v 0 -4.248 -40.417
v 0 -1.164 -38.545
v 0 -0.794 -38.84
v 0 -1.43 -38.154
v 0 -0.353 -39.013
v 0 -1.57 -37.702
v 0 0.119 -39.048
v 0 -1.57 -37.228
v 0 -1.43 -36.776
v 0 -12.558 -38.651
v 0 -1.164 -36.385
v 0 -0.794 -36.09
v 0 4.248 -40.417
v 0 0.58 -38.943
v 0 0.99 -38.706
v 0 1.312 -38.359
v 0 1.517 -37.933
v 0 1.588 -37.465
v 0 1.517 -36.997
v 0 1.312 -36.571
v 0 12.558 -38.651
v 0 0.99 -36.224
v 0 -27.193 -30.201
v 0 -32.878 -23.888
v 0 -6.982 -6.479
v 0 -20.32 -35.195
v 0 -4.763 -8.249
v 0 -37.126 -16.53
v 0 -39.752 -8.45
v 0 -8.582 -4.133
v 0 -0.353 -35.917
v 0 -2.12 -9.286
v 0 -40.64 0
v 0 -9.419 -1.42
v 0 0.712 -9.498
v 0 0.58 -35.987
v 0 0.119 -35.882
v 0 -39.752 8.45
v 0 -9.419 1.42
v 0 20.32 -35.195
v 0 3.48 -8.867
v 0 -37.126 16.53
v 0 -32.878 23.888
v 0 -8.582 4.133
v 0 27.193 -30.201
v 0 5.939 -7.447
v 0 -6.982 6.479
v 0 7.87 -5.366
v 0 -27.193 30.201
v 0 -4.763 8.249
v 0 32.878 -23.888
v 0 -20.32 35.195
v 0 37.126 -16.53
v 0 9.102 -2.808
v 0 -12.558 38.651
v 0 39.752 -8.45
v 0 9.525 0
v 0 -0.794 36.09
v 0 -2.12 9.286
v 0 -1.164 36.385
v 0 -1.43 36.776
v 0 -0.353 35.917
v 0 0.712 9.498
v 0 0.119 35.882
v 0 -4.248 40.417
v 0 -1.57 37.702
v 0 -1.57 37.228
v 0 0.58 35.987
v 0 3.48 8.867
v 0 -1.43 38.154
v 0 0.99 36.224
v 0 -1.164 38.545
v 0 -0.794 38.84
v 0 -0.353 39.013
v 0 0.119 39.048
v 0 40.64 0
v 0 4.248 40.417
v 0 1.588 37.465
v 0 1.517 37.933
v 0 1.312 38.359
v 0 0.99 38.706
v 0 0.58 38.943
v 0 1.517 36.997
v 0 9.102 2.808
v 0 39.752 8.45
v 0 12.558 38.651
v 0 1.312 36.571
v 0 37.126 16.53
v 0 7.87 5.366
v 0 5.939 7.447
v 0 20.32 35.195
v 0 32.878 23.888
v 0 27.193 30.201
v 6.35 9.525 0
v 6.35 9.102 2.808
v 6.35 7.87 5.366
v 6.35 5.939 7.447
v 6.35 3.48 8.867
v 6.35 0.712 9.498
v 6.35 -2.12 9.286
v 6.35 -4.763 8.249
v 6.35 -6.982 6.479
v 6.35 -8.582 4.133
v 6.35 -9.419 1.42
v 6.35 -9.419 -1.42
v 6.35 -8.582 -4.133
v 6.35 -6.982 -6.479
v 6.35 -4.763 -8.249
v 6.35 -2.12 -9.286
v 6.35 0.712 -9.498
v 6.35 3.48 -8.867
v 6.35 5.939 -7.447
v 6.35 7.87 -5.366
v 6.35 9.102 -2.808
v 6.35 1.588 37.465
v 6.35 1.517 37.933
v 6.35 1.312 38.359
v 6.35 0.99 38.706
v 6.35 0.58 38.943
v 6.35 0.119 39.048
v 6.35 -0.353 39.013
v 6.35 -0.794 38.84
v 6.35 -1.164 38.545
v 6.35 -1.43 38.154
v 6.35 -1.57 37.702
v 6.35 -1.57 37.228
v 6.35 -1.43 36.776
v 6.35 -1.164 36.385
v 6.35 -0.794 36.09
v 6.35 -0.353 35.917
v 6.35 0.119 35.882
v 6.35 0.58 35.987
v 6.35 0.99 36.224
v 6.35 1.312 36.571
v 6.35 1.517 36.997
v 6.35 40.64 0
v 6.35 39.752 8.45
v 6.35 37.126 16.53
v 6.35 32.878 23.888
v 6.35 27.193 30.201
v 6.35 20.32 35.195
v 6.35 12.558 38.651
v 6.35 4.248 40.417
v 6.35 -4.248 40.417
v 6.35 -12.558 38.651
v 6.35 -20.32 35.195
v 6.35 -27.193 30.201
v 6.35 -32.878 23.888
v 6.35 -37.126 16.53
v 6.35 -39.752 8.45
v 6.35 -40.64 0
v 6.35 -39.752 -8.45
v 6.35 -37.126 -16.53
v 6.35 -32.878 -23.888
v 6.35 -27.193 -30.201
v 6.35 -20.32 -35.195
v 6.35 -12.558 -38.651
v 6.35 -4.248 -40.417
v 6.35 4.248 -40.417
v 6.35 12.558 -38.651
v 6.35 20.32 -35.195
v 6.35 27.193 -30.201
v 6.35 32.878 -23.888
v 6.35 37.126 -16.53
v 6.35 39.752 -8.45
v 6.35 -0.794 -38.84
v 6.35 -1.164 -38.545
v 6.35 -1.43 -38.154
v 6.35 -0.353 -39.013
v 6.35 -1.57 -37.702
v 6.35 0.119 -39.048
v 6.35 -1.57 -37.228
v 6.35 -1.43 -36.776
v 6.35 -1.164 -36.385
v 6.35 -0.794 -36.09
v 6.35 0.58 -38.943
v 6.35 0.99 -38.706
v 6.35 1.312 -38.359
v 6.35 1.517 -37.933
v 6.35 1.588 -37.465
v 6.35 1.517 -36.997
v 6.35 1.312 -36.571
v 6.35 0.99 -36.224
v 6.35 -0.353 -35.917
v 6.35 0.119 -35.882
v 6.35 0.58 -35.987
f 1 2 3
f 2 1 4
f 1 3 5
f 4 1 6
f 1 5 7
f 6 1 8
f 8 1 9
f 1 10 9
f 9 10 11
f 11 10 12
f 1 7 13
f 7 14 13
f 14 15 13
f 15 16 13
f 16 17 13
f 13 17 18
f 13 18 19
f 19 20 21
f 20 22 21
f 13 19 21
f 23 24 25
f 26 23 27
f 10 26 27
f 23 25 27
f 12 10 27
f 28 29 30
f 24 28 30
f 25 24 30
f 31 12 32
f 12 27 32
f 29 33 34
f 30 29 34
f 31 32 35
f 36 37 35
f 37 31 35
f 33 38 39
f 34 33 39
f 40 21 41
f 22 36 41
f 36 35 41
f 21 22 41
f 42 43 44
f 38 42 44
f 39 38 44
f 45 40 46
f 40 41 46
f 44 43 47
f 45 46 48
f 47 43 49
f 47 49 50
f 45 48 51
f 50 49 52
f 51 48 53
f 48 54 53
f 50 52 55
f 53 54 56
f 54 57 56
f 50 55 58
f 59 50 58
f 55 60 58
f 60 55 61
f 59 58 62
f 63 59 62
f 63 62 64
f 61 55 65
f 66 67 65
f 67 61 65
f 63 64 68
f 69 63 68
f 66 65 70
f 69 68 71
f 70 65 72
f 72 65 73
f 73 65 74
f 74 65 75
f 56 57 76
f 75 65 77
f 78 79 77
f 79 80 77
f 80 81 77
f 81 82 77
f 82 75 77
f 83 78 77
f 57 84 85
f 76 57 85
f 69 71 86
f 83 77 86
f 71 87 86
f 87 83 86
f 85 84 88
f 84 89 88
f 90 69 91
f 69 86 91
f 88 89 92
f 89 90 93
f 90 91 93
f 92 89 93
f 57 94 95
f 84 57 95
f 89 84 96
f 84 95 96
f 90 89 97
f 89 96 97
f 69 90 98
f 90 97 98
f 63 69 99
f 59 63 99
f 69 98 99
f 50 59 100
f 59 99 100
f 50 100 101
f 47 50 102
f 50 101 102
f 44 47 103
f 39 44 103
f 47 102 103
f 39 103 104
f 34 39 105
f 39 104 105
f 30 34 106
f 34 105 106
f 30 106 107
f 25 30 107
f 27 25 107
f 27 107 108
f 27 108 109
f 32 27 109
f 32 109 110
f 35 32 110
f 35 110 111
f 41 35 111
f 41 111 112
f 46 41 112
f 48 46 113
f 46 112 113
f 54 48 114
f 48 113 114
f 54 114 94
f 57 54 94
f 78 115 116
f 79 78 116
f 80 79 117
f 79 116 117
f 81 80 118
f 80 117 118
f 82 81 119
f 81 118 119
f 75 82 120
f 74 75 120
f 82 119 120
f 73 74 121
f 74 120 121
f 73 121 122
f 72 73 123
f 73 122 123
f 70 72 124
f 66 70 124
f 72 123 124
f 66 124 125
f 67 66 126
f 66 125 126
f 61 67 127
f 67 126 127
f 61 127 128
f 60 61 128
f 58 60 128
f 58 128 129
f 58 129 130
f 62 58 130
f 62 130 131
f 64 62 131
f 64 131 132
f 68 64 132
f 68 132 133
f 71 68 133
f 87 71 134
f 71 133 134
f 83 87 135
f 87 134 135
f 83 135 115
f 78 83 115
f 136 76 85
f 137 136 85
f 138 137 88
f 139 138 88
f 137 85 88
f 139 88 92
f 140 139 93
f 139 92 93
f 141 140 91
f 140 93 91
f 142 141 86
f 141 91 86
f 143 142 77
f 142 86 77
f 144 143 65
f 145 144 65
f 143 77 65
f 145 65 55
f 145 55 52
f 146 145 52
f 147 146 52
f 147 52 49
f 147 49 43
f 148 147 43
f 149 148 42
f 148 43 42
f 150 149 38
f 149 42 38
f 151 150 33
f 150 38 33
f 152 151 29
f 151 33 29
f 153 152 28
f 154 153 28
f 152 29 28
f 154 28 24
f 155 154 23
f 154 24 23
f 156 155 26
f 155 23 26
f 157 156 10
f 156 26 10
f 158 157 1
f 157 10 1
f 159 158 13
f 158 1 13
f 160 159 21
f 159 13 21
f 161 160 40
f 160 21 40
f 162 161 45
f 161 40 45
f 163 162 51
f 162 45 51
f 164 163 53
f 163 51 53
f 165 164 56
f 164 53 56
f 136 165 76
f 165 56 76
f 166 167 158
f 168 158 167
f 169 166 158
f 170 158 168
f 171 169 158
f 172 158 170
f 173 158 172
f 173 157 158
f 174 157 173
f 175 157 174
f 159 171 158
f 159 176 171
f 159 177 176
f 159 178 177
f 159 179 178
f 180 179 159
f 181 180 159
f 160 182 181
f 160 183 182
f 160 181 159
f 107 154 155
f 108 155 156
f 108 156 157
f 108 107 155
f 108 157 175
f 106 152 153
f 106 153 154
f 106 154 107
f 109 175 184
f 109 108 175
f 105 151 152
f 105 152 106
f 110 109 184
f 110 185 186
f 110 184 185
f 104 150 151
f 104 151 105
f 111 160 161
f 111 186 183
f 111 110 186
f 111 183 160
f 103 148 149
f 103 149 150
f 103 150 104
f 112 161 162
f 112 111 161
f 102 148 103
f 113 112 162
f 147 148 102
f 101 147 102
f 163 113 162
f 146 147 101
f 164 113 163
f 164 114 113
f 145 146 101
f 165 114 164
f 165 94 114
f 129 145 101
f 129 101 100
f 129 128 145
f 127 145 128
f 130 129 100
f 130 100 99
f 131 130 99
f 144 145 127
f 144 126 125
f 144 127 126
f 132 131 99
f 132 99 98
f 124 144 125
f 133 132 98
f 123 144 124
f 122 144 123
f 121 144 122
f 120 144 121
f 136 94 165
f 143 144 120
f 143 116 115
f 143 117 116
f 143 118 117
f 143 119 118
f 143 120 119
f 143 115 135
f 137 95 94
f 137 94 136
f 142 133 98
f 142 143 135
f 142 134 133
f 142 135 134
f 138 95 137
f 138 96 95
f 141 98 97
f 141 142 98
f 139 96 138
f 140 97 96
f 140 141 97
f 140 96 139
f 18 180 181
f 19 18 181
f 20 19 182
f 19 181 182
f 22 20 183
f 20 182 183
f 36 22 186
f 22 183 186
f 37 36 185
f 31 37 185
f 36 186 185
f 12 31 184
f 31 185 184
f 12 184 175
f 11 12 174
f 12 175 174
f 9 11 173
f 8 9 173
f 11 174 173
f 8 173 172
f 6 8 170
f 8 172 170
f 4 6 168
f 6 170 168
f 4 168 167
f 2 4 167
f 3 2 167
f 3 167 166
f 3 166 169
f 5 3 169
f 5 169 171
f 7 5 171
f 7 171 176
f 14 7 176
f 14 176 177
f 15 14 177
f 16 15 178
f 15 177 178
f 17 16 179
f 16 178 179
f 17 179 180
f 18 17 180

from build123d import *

# Parameters (mm, degrees)
F0_R     = 40.64
F1_DEPTH = 6.35
F2_R     = 1.5875
F3_DEPTH = 6.35
F4_R     = 9.525
F5_DEPTH = 6.35


with BuildPart() as f1:
    # F0 (on Right) → F1 (new body)
    with BuildSketch(Plane.YZ):
        Circle(F0_R)
    extrude(amount=F1_DEPTH)

    # F2 (on face) → F3 (cut)
    with BuildSketch(Plane.YZ.offset(6.35)):
        with Locations((0, 37.465)):
            Circle(F2_R)
        with Locations((0, -37.465)):
            Circle(F2_R)
    extrude(amount=-F3_DEPTH, mode=Mode.SUBTRACT)

    # F4 (on face) → F5 (cut)
    with BuildSketch(Plane.YZ.offset(6.35)):
        Circle(F4_R)
    extrude(amount=-F5_DEPTH, mode=Mode.SUBTRACT)


solid = f1.part
